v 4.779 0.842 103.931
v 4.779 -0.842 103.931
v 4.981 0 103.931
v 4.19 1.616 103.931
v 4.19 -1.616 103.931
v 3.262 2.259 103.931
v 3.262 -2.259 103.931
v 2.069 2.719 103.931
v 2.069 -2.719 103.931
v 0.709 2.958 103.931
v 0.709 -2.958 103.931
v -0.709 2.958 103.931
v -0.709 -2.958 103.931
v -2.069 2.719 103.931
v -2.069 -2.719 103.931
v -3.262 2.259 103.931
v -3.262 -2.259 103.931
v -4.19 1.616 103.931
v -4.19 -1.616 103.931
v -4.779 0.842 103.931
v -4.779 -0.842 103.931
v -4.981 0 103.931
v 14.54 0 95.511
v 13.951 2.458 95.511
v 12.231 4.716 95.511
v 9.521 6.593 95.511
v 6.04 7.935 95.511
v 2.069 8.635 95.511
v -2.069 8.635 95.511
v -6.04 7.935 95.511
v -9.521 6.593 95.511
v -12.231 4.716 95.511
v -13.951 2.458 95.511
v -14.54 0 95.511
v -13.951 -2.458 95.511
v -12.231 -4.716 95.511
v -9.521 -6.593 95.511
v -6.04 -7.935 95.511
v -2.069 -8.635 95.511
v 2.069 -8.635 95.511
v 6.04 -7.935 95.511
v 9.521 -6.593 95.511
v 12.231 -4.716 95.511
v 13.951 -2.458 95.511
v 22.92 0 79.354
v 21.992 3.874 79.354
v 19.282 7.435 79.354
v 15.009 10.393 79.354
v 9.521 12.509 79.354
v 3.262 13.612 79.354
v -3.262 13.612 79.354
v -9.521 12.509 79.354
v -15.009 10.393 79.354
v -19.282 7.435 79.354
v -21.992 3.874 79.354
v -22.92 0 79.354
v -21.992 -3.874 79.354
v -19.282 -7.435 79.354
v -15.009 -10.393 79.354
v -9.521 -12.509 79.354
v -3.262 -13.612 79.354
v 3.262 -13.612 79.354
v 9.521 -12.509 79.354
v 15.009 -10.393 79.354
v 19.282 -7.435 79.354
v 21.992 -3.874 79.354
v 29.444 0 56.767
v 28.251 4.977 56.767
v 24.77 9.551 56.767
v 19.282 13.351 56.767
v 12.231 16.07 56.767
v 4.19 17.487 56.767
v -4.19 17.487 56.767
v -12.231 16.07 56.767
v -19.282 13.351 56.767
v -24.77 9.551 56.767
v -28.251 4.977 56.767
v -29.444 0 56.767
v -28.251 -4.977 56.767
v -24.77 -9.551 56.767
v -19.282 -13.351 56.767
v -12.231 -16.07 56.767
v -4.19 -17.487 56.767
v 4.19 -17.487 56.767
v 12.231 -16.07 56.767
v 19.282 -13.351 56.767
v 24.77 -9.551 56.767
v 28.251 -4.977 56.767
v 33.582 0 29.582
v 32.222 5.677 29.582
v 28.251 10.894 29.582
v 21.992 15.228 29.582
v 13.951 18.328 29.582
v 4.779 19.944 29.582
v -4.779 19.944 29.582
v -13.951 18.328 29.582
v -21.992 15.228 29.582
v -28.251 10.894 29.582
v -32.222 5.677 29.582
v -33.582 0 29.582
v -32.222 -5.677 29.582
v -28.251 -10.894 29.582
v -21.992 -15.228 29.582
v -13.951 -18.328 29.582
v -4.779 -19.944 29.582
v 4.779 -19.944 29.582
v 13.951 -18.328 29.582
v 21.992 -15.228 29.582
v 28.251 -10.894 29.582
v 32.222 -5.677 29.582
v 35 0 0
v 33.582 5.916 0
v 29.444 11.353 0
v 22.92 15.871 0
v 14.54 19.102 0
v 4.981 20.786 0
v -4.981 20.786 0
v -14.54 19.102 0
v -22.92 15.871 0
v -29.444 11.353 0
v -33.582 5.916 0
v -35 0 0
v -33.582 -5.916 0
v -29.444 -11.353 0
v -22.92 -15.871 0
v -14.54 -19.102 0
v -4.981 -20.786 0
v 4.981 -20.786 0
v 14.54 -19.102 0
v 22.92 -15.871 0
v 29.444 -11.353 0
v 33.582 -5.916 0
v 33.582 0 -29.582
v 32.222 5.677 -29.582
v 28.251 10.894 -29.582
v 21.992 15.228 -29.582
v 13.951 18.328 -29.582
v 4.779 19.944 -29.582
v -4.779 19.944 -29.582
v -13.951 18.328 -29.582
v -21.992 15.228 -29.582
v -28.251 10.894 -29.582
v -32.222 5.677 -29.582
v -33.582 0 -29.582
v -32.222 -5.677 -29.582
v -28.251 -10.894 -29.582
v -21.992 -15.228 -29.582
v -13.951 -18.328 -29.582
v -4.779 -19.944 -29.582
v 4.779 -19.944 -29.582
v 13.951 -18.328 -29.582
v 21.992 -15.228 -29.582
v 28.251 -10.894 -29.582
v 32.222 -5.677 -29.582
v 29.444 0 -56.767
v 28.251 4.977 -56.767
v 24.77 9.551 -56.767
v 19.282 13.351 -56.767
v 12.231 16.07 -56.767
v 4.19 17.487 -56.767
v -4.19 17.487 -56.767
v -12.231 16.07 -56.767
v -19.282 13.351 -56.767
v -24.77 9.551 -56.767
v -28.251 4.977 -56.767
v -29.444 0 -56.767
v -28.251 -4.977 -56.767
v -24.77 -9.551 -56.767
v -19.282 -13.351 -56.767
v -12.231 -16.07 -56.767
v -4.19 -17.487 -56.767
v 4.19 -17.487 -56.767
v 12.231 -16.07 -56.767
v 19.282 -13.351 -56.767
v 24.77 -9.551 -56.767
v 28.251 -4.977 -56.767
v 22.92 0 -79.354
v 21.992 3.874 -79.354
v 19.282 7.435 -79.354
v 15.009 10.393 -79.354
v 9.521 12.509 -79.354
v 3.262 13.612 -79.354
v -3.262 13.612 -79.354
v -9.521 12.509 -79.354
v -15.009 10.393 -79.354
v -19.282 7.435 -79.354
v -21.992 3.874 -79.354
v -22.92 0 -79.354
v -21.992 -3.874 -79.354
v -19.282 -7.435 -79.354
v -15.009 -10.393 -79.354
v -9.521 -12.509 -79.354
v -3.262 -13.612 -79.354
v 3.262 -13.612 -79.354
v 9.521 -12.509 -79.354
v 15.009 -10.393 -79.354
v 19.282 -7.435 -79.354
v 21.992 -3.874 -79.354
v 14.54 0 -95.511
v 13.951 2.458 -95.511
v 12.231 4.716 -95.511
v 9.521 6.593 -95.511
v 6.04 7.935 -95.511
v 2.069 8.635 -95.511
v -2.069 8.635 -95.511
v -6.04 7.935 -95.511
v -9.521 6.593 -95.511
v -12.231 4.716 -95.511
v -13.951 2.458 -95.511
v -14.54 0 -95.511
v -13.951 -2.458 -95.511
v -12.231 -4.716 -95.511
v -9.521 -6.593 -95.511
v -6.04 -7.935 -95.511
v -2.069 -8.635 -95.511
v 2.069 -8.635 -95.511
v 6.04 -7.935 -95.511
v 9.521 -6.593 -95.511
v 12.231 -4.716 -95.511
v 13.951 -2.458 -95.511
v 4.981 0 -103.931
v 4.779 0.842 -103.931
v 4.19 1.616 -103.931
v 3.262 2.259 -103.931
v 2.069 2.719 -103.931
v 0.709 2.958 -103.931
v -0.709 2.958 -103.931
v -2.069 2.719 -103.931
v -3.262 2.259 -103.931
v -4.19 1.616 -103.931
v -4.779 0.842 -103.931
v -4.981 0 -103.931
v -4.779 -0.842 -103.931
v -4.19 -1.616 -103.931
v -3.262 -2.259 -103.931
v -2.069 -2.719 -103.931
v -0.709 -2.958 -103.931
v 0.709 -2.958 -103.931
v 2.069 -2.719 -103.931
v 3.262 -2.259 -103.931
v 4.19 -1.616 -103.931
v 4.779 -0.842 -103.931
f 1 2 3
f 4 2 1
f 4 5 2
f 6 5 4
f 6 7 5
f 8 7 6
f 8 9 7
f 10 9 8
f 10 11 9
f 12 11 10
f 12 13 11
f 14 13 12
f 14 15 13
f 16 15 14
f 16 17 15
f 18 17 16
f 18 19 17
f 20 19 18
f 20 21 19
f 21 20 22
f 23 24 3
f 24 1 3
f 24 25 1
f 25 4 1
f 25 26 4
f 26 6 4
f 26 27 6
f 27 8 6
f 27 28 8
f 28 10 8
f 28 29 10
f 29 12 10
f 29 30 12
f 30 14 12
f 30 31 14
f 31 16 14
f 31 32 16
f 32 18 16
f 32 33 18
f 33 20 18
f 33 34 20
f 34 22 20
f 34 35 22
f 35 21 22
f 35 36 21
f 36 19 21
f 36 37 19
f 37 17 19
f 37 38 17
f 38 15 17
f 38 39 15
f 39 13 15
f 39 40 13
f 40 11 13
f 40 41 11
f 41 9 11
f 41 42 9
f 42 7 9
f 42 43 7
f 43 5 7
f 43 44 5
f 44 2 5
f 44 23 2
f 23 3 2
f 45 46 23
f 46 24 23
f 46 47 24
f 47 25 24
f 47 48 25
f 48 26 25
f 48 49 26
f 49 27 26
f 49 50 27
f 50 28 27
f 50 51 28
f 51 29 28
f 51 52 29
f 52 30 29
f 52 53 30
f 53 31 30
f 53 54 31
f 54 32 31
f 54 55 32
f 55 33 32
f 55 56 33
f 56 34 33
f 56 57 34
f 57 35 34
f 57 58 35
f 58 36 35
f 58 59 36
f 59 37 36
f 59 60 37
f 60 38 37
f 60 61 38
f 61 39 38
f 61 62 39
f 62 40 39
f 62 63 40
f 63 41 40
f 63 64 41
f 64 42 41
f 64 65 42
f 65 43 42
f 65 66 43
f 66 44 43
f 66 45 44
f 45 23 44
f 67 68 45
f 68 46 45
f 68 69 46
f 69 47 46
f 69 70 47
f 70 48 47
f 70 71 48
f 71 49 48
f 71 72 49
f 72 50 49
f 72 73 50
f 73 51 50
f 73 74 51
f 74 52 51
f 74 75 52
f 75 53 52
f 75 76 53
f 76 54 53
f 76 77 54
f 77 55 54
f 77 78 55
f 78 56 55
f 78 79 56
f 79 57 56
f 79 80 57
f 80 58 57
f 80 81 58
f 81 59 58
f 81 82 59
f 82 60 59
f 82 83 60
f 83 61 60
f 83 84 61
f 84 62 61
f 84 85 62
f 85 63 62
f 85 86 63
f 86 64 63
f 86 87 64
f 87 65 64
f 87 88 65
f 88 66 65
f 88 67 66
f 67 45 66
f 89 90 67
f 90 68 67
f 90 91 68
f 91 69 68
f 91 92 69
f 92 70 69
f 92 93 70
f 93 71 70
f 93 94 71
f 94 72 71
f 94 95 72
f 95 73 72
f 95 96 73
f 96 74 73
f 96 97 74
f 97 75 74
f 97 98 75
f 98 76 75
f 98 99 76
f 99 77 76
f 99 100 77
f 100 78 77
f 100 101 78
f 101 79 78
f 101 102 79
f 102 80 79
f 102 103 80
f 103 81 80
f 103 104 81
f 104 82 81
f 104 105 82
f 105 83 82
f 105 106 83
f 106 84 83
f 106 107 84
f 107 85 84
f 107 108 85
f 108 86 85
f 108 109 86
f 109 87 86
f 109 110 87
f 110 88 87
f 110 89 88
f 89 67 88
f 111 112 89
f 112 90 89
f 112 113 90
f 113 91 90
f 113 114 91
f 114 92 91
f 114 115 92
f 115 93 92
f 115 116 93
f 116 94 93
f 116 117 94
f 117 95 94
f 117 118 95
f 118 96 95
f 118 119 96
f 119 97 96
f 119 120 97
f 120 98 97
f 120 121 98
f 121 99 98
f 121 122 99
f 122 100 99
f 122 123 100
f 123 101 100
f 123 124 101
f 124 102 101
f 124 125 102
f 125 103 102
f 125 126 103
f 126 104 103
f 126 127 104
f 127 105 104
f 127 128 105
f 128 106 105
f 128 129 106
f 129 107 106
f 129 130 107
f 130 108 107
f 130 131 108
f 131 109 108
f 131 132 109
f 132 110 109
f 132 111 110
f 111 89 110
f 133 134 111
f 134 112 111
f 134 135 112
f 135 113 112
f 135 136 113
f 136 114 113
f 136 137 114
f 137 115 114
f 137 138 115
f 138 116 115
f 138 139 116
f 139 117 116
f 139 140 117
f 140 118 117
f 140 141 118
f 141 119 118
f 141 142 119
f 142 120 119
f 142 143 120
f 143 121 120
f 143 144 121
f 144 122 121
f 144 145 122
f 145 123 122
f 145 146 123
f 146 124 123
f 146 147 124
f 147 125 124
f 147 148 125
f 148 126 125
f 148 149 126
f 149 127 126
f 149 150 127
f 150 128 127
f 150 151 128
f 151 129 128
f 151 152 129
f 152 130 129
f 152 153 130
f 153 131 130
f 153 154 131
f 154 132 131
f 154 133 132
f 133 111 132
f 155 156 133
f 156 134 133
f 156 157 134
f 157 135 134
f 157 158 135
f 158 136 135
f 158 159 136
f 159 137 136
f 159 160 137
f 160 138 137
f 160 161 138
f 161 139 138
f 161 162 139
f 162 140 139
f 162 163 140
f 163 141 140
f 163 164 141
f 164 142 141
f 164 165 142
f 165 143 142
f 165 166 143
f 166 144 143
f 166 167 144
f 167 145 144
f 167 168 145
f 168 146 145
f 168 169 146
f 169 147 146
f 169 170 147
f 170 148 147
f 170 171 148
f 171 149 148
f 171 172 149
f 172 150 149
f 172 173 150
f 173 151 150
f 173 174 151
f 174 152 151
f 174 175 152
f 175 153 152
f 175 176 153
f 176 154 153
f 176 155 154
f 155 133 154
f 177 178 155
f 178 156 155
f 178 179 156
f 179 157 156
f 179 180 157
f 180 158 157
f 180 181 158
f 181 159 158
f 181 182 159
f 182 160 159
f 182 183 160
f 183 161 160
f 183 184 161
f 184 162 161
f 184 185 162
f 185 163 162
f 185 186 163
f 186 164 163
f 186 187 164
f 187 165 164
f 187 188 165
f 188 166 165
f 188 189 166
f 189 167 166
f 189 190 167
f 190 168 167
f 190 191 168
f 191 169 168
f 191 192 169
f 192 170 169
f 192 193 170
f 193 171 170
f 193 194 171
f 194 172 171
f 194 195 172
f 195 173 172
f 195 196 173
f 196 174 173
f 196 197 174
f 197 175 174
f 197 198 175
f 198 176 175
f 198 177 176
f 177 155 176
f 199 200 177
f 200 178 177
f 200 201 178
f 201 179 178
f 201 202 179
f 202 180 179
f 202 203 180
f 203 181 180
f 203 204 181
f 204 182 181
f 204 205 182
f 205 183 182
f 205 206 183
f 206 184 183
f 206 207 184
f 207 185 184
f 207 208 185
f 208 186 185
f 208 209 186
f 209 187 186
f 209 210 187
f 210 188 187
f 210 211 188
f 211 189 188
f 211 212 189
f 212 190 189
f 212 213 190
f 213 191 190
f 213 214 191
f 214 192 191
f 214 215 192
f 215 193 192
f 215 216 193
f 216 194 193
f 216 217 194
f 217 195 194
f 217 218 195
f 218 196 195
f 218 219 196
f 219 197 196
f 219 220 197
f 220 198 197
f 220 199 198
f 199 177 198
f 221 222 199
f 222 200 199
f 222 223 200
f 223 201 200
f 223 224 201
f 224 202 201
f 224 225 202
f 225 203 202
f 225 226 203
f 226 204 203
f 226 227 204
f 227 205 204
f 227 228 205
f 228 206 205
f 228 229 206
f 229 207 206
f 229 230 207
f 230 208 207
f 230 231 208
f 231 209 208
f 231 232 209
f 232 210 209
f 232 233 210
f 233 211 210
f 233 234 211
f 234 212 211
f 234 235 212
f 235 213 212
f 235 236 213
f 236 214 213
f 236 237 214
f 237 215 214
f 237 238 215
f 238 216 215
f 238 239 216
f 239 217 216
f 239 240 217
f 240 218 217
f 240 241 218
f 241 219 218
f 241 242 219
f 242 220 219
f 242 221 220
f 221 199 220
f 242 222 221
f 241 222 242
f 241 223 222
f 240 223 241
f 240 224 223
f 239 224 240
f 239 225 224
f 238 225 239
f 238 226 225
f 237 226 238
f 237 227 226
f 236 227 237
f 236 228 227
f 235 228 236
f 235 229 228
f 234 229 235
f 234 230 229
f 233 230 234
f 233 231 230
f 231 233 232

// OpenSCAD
// Generated by SolidPython 1.0.1 on 2020-07-29 00:46:46


scale(v = [5, 3, 15]) {
	sphere(r = 7);
}
/***********************************************
*********      SolidPython code:      **********
************************************************
 
# import packages: SolidPython
from solid import *
from solid.utils import *
from itertools import chain, combinations, permutations


class Resize:

    def __init__(self, scad_file):
        self.scad_file = scad_file
        #self.scad_file = import_scad(scad_file)
        # cone/cylinder param:
        self.r1 = 0
        self.r2 = 0
        self.h = 0
        # rectangular prism param:
        self.w = 0
        self.l = 0
        # ellipse param:
        self.r = 0

    # import OpenScad code (file name corresponds to shape)


    # classify shape + parameters
    def assign(self, param1, param2, param3):
        if self.scad_file == 'cone.scad':
            self.r1 = param1
            self.r2 = param2
            self.h = param3
        elif self.scad_file == 'cylinder.scad':
            self.r1 = param1
            self.r2 = param2
            self.h = param3
        elif self.scad_file == 'rectangularPrism.scad':
            self.h = param1
            self.l = param2
            self.w = param3
        else:
            self.r = param1
            self.h = param2

    # resize parameters
    def iterate(self):
        x = range(3, 20, 2)
        i = 1
        if self.scad_file == 'cone.scad':
            tempList = list(permutations(x, 2))
            for temp in tempList:
                param1 = temp[0]
                param2 = temp[1]
                filepath = 'produced_scad_files/' + 'cone' + str(param1) + '_' + str(param2) + '_' + '.scad'
                scad_render_to_file(cylinder(h=param1, r1=param2, r2=0), filepath)

        elif self.scad_file == 'cylinder.scad':
            tempList = list(permutations(x, 3))
            for temp in tempList:
                param1 = temp[0]
                param2 = temp[1]
                filepath = 'produced_scad_files/' + 'cylinder' + str(param1) + '_' + str(param2) + '_' + '.scad'
                scad_render_to_file(cylinder(h=param1, r1=param2, r2=param2), filepath)

        elif self.scad_file == 'rectangularPrism.scad':
            tempList = list(permutations(x, 3))
            for temp in tempList:
                param1 = temp[0]
                param2 = temp[1]
                param3 = temp[2]
                filepath = 'produced_scad_files/' + 'rectangularPrism' + str(param1) + '_' + str(param2) + '_' + str(
                    param3) + '.scad'
                scad_render_to_file(cube(size=(param1, param2, param3)), filepath)

        elif self.scad_file == 'ellipse.scad':
            tempList = list(permutations(x, 4))
            for temp in tempList:
                param1 = temp[0]
                param2 = temp[1]
                param3 = temp[2]
                param4 = temp[3]
                filepath = 'produced_scad_files/' + 'ellipse' + str(param1) + '_' + str(param2) + '_' + str(param3) + '_' + str(param4) + '.scad'
                scad_render_to_file(scale([param1, param2, param3])(sphere(r=param4)), filepath)

    def render_to_scadfile(self):
        scad_render_to_file(scad, 'example.scad') 
 
************************************************/
